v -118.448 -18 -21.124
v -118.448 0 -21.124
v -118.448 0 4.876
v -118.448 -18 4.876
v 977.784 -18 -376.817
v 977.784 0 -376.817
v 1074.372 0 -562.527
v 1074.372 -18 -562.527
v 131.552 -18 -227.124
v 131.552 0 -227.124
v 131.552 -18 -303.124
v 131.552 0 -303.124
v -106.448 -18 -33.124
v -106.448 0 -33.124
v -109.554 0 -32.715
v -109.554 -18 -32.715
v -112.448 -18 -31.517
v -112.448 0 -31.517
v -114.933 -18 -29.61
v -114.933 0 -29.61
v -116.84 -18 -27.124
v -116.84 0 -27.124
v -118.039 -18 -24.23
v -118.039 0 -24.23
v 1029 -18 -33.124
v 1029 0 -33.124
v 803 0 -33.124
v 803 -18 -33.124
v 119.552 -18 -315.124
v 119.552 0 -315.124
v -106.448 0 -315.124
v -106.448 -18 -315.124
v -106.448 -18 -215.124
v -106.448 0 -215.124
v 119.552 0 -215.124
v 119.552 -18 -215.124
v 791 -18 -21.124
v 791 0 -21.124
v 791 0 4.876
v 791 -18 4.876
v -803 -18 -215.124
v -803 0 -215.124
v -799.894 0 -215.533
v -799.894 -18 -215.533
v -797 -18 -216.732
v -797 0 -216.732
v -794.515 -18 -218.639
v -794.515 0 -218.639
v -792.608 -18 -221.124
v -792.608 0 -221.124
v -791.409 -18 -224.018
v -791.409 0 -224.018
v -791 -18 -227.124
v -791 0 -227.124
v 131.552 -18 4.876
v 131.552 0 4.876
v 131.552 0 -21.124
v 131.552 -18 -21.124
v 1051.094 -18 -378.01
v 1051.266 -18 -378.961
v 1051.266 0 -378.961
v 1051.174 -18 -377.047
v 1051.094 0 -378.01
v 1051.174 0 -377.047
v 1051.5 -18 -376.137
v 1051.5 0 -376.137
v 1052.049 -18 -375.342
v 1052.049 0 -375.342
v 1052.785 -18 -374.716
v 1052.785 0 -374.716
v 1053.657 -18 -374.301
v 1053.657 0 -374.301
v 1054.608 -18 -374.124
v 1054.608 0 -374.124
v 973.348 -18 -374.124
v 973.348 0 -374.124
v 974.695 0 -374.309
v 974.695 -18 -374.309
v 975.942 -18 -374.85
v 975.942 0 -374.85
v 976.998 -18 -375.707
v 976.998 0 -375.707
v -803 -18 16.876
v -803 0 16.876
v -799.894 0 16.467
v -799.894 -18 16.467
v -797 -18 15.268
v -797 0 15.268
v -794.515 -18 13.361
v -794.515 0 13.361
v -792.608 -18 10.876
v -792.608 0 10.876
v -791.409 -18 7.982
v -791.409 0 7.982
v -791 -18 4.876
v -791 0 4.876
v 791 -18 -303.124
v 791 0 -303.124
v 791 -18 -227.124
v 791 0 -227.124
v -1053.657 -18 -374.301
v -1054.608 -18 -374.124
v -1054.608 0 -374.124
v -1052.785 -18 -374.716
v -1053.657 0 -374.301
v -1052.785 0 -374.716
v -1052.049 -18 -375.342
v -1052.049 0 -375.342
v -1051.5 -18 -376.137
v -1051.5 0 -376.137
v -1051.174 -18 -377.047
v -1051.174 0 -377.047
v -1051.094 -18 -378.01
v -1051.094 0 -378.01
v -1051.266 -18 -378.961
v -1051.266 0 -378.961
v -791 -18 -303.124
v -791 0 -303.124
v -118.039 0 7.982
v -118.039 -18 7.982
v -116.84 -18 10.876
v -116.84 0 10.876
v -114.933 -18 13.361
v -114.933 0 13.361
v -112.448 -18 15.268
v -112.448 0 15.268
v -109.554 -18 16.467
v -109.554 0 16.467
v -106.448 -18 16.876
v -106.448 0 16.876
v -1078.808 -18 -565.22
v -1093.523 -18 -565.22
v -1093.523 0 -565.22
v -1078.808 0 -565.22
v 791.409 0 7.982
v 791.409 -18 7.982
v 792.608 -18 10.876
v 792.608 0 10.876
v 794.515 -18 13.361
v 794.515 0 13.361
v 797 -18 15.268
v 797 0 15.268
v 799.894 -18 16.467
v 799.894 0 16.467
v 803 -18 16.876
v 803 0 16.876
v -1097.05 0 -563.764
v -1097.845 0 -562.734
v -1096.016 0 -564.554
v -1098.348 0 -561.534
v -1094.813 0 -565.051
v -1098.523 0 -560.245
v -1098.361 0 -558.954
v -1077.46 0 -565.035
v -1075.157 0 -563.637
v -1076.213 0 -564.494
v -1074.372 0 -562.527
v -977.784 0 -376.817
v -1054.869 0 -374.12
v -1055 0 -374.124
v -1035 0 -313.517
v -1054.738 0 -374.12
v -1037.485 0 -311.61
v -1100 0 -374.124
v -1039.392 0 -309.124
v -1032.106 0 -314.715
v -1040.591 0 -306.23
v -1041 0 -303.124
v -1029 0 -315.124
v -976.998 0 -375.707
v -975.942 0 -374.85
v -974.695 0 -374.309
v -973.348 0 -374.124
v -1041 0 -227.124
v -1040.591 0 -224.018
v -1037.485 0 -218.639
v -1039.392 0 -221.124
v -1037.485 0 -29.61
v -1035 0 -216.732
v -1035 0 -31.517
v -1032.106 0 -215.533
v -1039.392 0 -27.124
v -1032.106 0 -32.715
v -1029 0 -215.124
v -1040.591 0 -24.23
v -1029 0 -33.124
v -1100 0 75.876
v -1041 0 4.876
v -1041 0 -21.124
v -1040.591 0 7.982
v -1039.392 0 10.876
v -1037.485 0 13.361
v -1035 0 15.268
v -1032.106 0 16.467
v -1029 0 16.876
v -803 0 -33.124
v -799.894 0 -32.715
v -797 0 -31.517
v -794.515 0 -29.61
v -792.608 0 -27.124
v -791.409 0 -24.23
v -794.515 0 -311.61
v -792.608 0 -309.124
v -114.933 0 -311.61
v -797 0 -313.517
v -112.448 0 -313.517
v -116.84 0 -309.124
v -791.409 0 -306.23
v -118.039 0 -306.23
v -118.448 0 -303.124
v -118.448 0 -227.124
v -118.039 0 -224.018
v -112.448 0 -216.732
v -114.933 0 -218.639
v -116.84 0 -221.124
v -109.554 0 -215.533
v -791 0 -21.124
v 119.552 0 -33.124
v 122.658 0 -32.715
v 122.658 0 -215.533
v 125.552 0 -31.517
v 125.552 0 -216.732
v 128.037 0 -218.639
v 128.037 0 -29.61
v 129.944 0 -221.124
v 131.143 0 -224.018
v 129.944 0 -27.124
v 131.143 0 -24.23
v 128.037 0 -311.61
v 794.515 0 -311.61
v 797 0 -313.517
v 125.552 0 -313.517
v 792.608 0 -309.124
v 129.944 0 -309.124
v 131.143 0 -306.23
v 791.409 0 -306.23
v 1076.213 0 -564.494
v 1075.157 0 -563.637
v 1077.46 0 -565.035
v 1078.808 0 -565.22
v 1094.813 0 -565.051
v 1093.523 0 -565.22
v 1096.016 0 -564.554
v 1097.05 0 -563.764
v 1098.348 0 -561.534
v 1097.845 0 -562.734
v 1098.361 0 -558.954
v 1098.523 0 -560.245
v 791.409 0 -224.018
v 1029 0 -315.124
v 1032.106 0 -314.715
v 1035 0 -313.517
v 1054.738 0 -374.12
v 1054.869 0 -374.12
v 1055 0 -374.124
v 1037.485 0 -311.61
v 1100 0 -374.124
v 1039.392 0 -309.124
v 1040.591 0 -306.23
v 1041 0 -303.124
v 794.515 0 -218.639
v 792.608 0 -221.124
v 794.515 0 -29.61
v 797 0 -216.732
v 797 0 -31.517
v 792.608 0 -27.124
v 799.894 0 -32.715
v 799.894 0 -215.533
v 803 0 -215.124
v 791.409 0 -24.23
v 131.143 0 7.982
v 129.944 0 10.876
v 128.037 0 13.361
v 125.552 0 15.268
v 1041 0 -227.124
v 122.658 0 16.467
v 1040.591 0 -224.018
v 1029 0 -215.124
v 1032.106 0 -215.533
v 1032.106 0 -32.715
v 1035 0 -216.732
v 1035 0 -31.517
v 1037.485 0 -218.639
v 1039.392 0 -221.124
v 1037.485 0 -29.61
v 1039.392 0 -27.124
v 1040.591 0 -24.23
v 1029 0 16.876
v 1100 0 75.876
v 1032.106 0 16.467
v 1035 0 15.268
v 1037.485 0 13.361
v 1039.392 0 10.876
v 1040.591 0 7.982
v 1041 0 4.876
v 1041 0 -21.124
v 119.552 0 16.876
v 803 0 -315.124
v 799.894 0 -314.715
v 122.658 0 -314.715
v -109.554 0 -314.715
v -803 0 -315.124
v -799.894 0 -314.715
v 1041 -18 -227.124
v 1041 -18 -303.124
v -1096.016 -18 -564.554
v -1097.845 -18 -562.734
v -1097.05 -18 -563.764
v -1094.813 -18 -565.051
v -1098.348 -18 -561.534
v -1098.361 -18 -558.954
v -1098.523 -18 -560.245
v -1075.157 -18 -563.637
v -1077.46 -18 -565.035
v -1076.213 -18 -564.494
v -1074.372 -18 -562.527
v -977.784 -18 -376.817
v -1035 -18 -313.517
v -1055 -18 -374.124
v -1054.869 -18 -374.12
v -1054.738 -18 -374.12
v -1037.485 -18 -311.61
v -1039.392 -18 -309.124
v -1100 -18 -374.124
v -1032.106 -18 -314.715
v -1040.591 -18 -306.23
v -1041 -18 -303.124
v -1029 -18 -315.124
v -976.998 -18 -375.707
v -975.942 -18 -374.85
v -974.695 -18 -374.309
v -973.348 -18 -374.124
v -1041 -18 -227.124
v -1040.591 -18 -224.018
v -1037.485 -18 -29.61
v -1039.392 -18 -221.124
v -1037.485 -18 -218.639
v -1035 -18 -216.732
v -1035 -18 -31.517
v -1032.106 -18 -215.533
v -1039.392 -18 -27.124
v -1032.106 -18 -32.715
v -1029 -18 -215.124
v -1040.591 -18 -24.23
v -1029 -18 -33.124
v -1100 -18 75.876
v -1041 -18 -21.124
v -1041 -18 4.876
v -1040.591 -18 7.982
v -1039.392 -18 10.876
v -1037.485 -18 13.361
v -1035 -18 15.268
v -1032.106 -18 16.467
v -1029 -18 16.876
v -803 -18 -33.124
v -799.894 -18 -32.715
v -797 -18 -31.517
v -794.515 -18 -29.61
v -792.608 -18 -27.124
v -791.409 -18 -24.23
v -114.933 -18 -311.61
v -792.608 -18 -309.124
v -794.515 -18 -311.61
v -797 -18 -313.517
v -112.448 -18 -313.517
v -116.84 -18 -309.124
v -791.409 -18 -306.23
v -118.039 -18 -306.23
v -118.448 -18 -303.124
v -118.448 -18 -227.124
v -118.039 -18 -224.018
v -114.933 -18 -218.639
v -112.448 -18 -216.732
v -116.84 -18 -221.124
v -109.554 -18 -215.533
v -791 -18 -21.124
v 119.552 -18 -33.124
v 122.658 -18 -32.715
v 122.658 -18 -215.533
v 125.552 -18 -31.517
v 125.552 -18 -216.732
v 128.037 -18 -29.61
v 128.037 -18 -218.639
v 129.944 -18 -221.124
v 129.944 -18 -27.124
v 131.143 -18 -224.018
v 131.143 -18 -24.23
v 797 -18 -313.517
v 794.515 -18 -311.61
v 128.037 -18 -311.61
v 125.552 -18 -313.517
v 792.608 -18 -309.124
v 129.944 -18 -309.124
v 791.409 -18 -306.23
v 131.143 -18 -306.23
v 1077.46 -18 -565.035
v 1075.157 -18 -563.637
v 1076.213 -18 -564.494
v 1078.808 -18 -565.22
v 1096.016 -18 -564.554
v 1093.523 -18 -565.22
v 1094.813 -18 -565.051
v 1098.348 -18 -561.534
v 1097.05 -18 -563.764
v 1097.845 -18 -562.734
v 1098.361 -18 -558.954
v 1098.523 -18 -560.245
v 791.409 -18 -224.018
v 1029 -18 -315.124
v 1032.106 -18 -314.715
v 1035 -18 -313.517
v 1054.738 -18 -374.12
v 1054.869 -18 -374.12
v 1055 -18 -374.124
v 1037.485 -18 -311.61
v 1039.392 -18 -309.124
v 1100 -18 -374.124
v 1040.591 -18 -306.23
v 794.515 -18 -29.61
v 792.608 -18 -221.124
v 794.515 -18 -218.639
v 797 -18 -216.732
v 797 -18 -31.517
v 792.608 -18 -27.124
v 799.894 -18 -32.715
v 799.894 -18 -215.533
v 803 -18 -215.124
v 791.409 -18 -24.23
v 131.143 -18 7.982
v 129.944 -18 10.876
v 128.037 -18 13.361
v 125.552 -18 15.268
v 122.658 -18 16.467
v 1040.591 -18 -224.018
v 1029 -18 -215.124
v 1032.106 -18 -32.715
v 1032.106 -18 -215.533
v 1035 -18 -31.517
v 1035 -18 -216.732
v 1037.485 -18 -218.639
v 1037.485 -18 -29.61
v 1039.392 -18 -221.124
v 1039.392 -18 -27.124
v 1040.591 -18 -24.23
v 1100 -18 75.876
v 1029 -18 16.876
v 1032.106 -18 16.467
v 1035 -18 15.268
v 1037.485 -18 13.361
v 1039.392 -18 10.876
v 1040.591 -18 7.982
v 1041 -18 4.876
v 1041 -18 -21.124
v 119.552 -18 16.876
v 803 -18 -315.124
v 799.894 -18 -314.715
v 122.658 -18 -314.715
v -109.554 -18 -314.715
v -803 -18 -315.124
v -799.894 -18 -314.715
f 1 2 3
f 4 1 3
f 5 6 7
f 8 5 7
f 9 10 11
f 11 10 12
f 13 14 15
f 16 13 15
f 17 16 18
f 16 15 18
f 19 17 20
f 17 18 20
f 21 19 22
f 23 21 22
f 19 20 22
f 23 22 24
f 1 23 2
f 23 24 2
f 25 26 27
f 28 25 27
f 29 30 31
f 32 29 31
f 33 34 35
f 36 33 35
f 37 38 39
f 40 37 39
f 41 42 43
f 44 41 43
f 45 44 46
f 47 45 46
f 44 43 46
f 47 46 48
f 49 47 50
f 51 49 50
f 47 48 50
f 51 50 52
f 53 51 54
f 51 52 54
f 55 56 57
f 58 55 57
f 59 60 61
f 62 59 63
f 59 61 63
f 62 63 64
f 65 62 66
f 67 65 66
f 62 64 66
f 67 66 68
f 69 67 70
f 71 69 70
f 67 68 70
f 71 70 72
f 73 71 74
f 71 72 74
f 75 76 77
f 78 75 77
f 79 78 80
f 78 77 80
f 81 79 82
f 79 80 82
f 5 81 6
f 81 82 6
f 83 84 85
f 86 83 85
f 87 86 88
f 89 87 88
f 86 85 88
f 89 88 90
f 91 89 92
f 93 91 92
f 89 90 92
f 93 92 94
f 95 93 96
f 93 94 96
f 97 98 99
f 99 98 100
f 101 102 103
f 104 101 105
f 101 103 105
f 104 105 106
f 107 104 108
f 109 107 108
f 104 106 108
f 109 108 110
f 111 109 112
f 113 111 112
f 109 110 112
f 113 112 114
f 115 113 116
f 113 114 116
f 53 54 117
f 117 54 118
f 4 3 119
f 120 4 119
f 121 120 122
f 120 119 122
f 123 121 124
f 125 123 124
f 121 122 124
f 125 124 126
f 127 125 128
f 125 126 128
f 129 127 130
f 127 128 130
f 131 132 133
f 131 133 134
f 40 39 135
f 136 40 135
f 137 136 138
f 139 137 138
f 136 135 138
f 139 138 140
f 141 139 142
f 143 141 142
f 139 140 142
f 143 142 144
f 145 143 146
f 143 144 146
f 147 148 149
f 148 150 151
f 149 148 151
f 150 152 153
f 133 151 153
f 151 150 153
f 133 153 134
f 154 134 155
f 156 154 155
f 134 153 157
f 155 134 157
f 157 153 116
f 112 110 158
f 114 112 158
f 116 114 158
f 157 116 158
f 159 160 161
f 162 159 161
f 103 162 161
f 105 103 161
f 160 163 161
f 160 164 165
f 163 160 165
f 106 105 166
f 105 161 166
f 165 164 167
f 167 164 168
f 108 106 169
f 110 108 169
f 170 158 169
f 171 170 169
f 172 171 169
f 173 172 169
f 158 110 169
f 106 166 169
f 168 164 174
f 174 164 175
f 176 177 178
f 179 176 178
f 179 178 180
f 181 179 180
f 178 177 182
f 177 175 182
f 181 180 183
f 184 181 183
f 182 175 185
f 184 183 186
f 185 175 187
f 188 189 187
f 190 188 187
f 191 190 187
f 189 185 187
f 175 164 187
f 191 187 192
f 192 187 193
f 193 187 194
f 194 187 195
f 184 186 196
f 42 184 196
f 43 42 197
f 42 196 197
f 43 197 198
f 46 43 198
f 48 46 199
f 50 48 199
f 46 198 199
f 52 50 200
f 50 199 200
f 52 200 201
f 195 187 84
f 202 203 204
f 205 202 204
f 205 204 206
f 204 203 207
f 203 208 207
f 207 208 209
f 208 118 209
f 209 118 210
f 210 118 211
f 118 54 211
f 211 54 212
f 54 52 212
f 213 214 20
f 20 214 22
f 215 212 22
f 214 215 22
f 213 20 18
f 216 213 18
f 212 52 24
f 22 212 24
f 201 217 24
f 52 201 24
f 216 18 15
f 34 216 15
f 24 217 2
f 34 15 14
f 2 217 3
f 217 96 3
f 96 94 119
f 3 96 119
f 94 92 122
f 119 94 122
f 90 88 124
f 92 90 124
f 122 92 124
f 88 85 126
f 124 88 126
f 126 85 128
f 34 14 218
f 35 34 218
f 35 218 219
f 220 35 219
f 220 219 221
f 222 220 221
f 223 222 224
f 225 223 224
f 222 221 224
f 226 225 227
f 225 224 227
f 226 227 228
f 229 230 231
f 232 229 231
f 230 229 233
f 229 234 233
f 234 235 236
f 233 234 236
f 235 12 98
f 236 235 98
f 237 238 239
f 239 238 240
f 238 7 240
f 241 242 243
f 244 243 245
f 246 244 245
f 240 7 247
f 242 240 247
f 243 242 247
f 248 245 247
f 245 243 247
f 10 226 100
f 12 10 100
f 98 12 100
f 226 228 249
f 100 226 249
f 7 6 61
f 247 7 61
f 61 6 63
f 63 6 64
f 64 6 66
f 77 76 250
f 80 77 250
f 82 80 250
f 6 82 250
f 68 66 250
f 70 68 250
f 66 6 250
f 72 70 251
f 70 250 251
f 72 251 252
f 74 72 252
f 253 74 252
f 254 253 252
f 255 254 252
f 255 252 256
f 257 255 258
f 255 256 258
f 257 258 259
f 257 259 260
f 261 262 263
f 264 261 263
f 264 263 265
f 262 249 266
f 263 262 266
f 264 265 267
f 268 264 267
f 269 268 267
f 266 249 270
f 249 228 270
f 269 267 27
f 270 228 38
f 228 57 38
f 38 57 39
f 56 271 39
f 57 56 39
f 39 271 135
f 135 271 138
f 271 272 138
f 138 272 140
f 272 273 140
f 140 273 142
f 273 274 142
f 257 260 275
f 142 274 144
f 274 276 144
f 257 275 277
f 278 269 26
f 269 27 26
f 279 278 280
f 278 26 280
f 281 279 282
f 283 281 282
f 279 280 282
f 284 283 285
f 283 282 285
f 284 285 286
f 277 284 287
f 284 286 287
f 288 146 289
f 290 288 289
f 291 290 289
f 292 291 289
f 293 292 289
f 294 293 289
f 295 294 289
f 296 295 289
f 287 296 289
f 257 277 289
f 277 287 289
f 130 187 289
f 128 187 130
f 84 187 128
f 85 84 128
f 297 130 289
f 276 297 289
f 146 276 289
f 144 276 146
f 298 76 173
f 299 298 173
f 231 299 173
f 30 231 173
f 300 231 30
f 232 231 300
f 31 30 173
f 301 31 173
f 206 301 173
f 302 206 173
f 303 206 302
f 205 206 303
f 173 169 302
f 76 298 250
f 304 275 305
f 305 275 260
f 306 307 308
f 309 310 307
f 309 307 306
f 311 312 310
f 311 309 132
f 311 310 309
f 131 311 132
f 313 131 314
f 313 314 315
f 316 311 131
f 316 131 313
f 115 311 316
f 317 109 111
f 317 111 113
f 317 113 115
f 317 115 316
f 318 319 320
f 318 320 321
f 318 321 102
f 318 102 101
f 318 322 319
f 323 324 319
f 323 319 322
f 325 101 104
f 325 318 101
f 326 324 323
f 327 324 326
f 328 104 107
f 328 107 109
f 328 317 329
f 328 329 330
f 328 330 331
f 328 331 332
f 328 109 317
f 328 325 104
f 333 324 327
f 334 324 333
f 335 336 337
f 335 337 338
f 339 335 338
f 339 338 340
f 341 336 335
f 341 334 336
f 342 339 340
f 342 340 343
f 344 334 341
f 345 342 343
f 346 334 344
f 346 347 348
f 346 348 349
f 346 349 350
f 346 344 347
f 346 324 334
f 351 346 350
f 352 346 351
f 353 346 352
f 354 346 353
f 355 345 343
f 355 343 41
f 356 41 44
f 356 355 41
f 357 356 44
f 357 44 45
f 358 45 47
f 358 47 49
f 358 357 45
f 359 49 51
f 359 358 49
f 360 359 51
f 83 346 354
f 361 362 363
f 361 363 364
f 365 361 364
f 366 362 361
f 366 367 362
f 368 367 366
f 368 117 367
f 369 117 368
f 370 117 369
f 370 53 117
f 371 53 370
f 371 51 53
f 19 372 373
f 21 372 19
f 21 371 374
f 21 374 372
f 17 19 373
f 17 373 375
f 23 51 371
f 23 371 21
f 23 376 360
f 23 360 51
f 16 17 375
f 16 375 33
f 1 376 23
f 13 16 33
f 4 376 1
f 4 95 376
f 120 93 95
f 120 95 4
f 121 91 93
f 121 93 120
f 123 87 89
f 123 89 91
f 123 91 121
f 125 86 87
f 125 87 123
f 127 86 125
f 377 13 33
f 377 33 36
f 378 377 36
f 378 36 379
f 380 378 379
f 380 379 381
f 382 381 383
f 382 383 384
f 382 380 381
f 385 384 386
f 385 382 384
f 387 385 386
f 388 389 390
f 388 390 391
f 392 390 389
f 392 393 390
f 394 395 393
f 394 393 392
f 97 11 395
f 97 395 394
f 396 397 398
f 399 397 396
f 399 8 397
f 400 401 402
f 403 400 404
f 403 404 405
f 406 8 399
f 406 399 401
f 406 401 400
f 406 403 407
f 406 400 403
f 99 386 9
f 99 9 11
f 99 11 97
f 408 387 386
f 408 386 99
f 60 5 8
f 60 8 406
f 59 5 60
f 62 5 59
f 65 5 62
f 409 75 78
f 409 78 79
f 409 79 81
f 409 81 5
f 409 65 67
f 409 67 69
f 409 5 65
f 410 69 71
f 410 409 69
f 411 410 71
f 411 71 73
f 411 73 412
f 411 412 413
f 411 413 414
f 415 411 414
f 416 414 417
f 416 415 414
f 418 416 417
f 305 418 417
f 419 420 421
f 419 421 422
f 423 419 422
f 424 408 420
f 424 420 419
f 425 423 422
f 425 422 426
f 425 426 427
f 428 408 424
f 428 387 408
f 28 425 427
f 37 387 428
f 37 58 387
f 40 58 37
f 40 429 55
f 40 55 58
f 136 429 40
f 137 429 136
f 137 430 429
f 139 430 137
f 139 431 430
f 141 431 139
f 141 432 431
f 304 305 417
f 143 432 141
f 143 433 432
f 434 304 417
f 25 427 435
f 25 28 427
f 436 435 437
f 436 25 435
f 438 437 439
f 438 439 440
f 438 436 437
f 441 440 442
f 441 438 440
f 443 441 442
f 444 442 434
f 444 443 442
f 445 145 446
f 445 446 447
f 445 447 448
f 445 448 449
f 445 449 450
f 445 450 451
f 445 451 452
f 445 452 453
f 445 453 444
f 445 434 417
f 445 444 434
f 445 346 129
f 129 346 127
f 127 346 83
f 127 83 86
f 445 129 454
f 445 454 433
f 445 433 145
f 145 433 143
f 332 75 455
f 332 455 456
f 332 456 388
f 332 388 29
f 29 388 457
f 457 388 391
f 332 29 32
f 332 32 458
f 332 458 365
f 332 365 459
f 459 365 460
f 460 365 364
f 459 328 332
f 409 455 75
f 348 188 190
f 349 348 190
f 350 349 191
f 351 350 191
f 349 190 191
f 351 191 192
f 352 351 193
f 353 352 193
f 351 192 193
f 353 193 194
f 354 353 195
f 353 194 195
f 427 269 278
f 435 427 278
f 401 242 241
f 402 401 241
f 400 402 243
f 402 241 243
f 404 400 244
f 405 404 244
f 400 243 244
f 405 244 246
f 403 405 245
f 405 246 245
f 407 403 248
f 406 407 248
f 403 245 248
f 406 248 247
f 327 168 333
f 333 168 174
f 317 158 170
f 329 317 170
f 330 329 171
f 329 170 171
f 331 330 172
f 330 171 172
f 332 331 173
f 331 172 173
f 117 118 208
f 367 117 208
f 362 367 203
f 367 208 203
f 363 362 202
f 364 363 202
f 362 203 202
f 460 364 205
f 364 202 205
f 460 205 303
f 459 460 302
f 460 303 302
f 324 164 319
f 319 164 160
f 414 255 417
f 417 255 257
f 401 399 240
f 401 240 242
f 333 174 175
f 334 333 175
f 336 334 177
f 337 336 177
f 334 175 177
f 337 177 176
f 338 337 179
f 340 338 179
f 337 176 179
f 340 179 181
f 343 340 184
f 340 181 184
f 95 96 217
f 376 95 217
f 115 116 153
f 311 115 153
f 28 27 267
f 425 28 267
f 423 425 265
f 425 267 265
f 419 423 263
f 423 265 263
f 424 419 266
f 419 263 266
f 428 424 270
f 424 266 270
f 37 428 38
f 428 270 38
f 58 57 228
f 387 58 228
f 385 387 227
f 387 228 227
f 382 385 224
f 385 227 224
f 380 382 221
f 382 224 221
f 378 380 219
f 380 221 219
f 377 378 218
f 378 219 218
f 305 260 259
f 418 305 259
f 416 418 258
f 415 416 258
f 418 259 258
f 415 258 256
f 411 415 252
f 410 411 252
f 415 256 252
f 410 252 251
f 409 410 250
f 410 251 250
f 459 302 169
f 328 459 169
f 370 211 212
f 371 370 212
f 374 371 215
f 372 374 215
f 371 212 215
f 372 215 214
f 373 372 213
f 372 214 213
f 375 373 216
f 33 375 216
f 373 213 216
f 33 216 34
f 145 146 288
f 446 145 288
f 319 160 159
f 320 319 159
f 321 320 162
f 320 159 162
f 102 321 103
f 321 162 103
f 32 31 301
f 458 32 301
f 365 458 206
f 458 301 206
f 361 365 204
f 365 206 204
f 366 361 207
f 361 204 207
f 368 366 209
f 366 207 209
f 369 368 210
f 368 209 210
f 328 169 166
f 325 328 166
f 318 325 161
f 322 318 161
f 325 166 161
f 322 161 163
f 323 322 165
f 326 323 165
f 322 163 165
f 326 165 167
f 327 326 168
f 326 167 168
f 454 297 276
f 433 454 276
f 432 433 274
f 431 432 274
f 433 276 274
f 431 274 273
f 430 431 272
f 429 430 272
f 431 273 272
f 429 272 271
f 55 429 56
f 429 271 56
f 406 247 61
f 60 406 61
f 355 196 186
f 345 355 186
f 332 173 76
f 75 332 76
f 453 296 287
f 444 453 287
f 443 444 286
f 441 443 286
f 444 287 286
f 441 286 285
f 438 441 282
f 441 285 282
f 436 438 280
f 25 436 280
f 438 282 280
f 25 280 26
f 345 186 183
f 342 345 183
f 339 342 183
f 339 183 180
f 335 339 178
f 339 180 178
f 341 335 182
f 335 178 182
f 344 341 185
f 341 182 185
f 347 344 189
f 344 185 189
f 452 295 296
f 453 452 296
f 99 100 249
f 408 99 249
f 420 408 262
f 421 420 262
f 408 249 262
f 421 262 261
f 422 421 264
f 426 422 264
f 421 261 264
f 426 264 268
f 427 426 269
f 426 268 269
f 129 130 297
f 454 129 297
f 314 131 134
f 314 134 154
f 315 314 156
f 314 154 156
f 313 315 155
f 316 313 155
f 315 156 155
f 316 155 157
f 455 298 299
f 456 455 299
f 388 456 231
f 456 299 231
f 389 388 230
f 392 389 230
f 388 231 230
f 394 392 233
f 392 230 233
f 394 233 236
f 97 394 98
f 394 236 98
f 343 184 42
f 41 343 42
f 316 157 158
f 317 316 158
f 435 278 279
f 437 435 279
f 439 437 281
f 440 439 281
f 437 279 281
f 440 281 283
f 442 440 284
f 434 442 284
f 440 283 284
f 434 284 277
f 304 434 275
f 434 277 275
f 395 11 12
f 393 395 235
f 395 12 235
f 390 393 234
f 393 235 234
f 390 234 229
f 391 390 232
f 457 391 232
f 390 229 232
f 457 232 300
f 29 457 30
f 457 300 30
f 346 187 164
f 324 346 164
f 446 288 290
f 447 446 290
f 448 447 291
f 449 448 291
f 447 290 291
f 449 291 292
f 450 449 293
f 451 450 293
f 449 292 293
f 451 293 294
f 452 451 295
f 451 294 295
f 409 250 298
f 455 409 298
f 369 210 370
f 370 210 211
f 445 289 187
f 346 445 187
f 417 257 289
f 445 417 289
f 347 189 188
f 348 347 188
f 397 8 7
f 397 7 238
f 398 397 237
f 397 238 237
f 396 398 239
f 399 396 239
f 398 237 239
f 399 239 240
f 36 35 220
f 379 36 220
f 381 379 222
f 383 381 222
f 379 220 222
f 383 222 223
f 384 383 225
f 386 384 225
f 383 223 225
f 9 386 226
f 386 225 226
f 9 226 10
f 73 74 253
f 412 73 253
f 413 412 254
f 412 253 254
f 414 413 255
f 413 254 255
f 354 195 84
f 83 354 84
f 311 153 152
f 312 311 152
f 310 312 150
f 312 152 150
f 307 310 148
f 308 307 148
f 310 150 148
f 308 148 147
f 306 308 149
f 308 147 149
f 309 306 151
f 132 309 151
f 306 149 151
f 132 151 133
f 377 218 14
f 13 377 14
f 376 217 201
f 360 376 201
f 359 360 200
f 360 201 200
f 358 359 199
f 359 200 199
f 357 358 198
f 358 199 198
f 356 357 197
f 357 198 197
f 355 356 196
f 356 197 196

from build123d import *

# Parameters (mm, degrees)
F0_W     = 9
F0_H     = 432
F0_H_2   = 9
F1_DEPTH = 18


# Not quite as in the source:
# - a feature names something its author has since deleted; it is built from what else it names


with BuildPart() as f1:
    # F0 (on Front) → F1 (new body)
    with BuildSketch(Plane.XZ):
        Polygon((0, 75.8756743552), (-1100, 75.8756743552), (-1100, 66.8756743552), (-1091, 66.8756743552), (0, 66.8756743552), (1091, 66.8756743552), (1091, 75.8756743552), align=None)
        with BuildLine():
            Line((-973.3476458471, -374.1243256448), (-1054.6076226562, -374.1243256448))
            ThreePointArc((-1054.6076226562, -374.1243256448), (-1051.7483407187, -375.721921149), (-1051.265639742, -378.9614896944))
            Line((-1051.265639742, -378.9614896944), (-1098.3606008427, -558.954299013))
            ThreePointArc((-1098.3606008427, -558.954299013), (-1097.4812264988, -563.2754093644), (-1093.523436793, -565.219938755))
            Line((-1093.523436793, -565.219938755), (-1078.8076104242, -565.219938755))
            ThreePointArc((-1078.8076104242, -565.219938755), (-1076.2129629213, -564.4940239596), (-1074.371712623, -562.5270604893))
            Line((-1074.371712623, -562.5270604893), (-977.7835436484, -376.8172039105))
            ThreePointArc((-977.7835436484, -376.8172039105), (-975.94229335, -374.8502404402), (-973.3476458471, -374.1243256448))
        make_face()
        with BuildLine():
            Line((1100, 66.8756743552), (1091, 66.8756743552))
            Line((1091, 66.8756743552), (1091, -365.0378882885))
            Line((1091, -365.0378882885), (1091, -365.1243256448))
            Line((1091, -365.1243256448), (0, -365.1243256448))
            Line((0, -365.1243256448), (-1091, -365.1243256448))
            Line((-1091, -365.1243256448), (-1091, -374.1243256448))
            Line((-1091, -374.1243256448), (-1055, -374.1243256448))
            ThreePointArc((-1055, -374.1243256448), (-1054.8038113281, -374.1191399972), (-1054.6076226562, -374.1243256448))
            Line((-1054.6076226562, -374.1243256448), (-973.3476458471, -374.1243256448))
            Line((-973.3476458471, -374.1243256448), (0, -374.1243256448))
            Line((0, -374.1243256448), (973.3476458471, -374.1243256448))
            Line((973.3476458471, -374.1243256448), (1054.6076226562, -374.1243256448))
            ThreePointArc((1054.6076226562, -374.1243256448), (1054.8038113281, -374.1191399972), (1055, -374.1243256448))
            Line((1055, -374.1243256448), (1100, -374.1243256448))
            Line((1100, -374.1243256448), (1100, 66.8756743552))
        make_face()
        with Locations((-1095.5, -149.1243256448)):
            Rectangle(F0_W, F0_H)
        with Locations((-1095.5, -369.6243256448)):
            Rectangle(F0_W, F0_H_2)
        with Locations((1095.5, 71.3756743552)):
            Rectangle(F0_W, F0_H_2)
        with BuildLine():
            ThreePointArc((1051.265639742, -378.9614896944), (1051.7483407187, -375.721921149), (1054.6076226562, -374.1243256448))
            Line((1054.6076226562, -374.1243256448), (973.3476458471, -374.1243256448))
            ThreePointArc((973.3476458471, -374.1243256448), (975.94229335, -374.8502404402), (977.7835436484, -376.8172039105))
            Line((977.7835436484, -376.8172039105), (1074.371712623, -562.5270604893))
            ThreePointArc((1074.371712623, -562.5270604893), (1076.2129629213, -564.4940239596), (1078.8076104242, -565.219938755))
            Line((1078.8076104242, -565.219938755), (1093.523436793, -565.219938755))
            ThreePointArc((1093.523436793, -565.219938755), (1097.4812264988, -563.2754093644), (1098.3606008427, -558.954299013))
            Line((1098.3606008427, -558.954299013), (1051.265639742, -378.9614896944))
        make_face()
        Polygon((0, 66.8756743552), (-1091, 66.8756743552), (-1091, -365.1243256448), (0, -365.1243256448), (1091, -365.1243256448), (1091, -365.0378882885), (1091, 66.8756743552), align=None)
        with BuildLine():
            ThreePointArc((-1041, -227.1243239641), (-1037.4852813742, -218.6390425899), (-1029, -215.1243239641))
            Line((-1029, -215.1243239641), (-803, -215.1243239641))
            ThreePointArc((-803, -215.1243239641), (-794.5147186258, -218.6390425899), (-791, -227.1243239641))
            Line((-791, -227.1243239641), (-791, -303.1243256448))
            ThreePointArc((-791, -303.1243256448), (-794.5147186258, -311.609607019), (-803, -315.1243256448))
            Line((-803, -315.1243256448), (-1029, -315.1243256448))
            ThreePointArc((-1029, -315.1243256448), (-1037.4852813742, -311.609607019), (-1041, -303.1243256448))
            Line((-1041, -303.1243256448), (-1041, -227.1243239641))
        make_face(mode=Mode.SUBTRACT)
        with BuildLine():
            ThreePointArc((-118.4479668736, -227.1243239641), (-114.9332482479, -218.6390425899), (-106.4479668736, -215.1243239641))
            Line((-106.4479668736, -215.1243239641), (119.5520331264, -215.1243239641))
            ThreePointArc((119.5520331264, -215.1243239641), (128.0373145006, -218.6390425899), (131.5520331264, -227.1243239641))
            Line((131.5520331264, -227.1243239641), (131.5520331264, -303.1243256448))
            ThreePointArc((131.5520331264, -303.1243256448), (128.0373145006, -311.609607019), (119.5520331264, -315.1243256448))
            Line((119.5520331264, -315.1243256448), (-106.4479668736, -315.1243256448))
            ThreePointArc((-106.4479668736, -315.1243256448), (-114.9332482479, -311.609607019), (-118.4479668736, -303.1243256448))
            Line((-118.4479668736, -303.1243256448), (-118.4479668736, -227.1243239641))
        make_face(mode=Mode.SUBTRACT)
        with BuildLine():
            Line((791, -303.1243256448), (791, -227.1243239641))
            ThreePointArc((791, -227.1243239641), (794.5147186258, -218.6390425899), (803, -215.1243239641))
            Line((803, -215.1243239641), (1029, -215.1243239641))
            ThreePointArc((1029, -215.1243239641), (1037.4852813742, -218.6390425899), (1041, -227.1243239641))
            Line((1041, -227.1243239641), (1041, -303.1243256448))
            ThreePointArc((1041, -303.1243256448), (1037.4852813742, -311.609607019), (1029, -315.1243256448))
            Line((1029, -315.1243256448), (803, -315.1243256448))
            ThreePointArc((803, -315.1243256448), (794.5147186258, -311.609607019), (791, -303.1243256448))
        make_face(mode=Mode.SUBTRACT)
        with BuildLine():
            ThreePointArc((-1041, 4.8756749481), (-1037.4852813742, 13.3609563223), (-1029, 16.8756749481))
            Line((-1029, 16.8756749481), (-803, 16.8756749481))
            ThreePointArc((-803, 16.8756749481), (-794.5147186258, 13.3609563223), (-791, 4.8756749481))
            Line((-791, 4.8756749481), (-791, -21.1243239343))
            ThreePointArc((-791, -21.1243239343), (-794.5147186258, -29.6096053086), (-803, -33.1243239343))
            Line((-803, -33.1243239343), (-1029, -33.1243239343))
            ThreePointArc((-1029, -33.1243239343), (-1037.4852813742, -29.6096053086), (-1041, -21.1243239343))
            Line((-1041, -21.1243239343), (-1041, 4.8756749481))
        make_face(mode=Mode.SUBTRACT)
        with BuildLine():
            ThreePointArc((-118.4479668736, 4.8756749481), (-114.9332482479, 13.3609563223), (-106.4479668736, 16.8756749481))
            Line((-106.4479668736, 16.8756749481), (119.5520331264, 16.8756749481))
            ThreePointArc((119.5520331264, 16.8756749481), (128.0373145006, 13.3609563223), (131.5520331264, 4.8756749481))
            Line((131.5520331264, 4.8756749481), (131.5520331264, -21.1243239343))
            ThreePointArc((131.5520331264, -21.1243239343), (128.0373145006, -29.6096053086), (119.5520331264, -33.1243239343))
            Line((119.5520331264, -33.1243239343), (-106.4479668736, -33.1243239343))
            ThreePointArc((-106.4479668736, -33.1243239343), (-114.9332482479, -29.6096053086), (-118.4479668736, -21.1243239343))
            Line((-118.4479668736, -21.1243239343), (-118.4479668736, 4.8756749481))
        make_face(mode=Mode.SUBTRACT)
        with BuildLine():
            Line((803, 16.8756749481), (1029, 16.8756749481))
            ThreePointArc((1029, 16.8756749481), (1037.4852813742, 13.3609563223), (1041, 4.8756749481))
            Line((1041, 4.8756749481), (1041, -21.1243239343))
            ThreePointArc((1041, -21.1243239343), (1037.4852813742, -29.6096053086), (1029, -33.1243239343))
            Line((1029, -33.1243239343), (803, -33.1243239343))
            ThreePointArc((803, -33.1243239343), (794.5147186258, -29.6096053086), (791, -21.1243239343))
            Line((791, -21.1243239343), (791, 4.8756749481))
            ThreePointArc((791, 4.8756749481), (794.5147186258, 13.3609563223), (803, 16.8756749481))
        make_face(mode=Mode.SUBTRACT)
    extrude(amount=F1_DEPTH)


solid = f1.part
